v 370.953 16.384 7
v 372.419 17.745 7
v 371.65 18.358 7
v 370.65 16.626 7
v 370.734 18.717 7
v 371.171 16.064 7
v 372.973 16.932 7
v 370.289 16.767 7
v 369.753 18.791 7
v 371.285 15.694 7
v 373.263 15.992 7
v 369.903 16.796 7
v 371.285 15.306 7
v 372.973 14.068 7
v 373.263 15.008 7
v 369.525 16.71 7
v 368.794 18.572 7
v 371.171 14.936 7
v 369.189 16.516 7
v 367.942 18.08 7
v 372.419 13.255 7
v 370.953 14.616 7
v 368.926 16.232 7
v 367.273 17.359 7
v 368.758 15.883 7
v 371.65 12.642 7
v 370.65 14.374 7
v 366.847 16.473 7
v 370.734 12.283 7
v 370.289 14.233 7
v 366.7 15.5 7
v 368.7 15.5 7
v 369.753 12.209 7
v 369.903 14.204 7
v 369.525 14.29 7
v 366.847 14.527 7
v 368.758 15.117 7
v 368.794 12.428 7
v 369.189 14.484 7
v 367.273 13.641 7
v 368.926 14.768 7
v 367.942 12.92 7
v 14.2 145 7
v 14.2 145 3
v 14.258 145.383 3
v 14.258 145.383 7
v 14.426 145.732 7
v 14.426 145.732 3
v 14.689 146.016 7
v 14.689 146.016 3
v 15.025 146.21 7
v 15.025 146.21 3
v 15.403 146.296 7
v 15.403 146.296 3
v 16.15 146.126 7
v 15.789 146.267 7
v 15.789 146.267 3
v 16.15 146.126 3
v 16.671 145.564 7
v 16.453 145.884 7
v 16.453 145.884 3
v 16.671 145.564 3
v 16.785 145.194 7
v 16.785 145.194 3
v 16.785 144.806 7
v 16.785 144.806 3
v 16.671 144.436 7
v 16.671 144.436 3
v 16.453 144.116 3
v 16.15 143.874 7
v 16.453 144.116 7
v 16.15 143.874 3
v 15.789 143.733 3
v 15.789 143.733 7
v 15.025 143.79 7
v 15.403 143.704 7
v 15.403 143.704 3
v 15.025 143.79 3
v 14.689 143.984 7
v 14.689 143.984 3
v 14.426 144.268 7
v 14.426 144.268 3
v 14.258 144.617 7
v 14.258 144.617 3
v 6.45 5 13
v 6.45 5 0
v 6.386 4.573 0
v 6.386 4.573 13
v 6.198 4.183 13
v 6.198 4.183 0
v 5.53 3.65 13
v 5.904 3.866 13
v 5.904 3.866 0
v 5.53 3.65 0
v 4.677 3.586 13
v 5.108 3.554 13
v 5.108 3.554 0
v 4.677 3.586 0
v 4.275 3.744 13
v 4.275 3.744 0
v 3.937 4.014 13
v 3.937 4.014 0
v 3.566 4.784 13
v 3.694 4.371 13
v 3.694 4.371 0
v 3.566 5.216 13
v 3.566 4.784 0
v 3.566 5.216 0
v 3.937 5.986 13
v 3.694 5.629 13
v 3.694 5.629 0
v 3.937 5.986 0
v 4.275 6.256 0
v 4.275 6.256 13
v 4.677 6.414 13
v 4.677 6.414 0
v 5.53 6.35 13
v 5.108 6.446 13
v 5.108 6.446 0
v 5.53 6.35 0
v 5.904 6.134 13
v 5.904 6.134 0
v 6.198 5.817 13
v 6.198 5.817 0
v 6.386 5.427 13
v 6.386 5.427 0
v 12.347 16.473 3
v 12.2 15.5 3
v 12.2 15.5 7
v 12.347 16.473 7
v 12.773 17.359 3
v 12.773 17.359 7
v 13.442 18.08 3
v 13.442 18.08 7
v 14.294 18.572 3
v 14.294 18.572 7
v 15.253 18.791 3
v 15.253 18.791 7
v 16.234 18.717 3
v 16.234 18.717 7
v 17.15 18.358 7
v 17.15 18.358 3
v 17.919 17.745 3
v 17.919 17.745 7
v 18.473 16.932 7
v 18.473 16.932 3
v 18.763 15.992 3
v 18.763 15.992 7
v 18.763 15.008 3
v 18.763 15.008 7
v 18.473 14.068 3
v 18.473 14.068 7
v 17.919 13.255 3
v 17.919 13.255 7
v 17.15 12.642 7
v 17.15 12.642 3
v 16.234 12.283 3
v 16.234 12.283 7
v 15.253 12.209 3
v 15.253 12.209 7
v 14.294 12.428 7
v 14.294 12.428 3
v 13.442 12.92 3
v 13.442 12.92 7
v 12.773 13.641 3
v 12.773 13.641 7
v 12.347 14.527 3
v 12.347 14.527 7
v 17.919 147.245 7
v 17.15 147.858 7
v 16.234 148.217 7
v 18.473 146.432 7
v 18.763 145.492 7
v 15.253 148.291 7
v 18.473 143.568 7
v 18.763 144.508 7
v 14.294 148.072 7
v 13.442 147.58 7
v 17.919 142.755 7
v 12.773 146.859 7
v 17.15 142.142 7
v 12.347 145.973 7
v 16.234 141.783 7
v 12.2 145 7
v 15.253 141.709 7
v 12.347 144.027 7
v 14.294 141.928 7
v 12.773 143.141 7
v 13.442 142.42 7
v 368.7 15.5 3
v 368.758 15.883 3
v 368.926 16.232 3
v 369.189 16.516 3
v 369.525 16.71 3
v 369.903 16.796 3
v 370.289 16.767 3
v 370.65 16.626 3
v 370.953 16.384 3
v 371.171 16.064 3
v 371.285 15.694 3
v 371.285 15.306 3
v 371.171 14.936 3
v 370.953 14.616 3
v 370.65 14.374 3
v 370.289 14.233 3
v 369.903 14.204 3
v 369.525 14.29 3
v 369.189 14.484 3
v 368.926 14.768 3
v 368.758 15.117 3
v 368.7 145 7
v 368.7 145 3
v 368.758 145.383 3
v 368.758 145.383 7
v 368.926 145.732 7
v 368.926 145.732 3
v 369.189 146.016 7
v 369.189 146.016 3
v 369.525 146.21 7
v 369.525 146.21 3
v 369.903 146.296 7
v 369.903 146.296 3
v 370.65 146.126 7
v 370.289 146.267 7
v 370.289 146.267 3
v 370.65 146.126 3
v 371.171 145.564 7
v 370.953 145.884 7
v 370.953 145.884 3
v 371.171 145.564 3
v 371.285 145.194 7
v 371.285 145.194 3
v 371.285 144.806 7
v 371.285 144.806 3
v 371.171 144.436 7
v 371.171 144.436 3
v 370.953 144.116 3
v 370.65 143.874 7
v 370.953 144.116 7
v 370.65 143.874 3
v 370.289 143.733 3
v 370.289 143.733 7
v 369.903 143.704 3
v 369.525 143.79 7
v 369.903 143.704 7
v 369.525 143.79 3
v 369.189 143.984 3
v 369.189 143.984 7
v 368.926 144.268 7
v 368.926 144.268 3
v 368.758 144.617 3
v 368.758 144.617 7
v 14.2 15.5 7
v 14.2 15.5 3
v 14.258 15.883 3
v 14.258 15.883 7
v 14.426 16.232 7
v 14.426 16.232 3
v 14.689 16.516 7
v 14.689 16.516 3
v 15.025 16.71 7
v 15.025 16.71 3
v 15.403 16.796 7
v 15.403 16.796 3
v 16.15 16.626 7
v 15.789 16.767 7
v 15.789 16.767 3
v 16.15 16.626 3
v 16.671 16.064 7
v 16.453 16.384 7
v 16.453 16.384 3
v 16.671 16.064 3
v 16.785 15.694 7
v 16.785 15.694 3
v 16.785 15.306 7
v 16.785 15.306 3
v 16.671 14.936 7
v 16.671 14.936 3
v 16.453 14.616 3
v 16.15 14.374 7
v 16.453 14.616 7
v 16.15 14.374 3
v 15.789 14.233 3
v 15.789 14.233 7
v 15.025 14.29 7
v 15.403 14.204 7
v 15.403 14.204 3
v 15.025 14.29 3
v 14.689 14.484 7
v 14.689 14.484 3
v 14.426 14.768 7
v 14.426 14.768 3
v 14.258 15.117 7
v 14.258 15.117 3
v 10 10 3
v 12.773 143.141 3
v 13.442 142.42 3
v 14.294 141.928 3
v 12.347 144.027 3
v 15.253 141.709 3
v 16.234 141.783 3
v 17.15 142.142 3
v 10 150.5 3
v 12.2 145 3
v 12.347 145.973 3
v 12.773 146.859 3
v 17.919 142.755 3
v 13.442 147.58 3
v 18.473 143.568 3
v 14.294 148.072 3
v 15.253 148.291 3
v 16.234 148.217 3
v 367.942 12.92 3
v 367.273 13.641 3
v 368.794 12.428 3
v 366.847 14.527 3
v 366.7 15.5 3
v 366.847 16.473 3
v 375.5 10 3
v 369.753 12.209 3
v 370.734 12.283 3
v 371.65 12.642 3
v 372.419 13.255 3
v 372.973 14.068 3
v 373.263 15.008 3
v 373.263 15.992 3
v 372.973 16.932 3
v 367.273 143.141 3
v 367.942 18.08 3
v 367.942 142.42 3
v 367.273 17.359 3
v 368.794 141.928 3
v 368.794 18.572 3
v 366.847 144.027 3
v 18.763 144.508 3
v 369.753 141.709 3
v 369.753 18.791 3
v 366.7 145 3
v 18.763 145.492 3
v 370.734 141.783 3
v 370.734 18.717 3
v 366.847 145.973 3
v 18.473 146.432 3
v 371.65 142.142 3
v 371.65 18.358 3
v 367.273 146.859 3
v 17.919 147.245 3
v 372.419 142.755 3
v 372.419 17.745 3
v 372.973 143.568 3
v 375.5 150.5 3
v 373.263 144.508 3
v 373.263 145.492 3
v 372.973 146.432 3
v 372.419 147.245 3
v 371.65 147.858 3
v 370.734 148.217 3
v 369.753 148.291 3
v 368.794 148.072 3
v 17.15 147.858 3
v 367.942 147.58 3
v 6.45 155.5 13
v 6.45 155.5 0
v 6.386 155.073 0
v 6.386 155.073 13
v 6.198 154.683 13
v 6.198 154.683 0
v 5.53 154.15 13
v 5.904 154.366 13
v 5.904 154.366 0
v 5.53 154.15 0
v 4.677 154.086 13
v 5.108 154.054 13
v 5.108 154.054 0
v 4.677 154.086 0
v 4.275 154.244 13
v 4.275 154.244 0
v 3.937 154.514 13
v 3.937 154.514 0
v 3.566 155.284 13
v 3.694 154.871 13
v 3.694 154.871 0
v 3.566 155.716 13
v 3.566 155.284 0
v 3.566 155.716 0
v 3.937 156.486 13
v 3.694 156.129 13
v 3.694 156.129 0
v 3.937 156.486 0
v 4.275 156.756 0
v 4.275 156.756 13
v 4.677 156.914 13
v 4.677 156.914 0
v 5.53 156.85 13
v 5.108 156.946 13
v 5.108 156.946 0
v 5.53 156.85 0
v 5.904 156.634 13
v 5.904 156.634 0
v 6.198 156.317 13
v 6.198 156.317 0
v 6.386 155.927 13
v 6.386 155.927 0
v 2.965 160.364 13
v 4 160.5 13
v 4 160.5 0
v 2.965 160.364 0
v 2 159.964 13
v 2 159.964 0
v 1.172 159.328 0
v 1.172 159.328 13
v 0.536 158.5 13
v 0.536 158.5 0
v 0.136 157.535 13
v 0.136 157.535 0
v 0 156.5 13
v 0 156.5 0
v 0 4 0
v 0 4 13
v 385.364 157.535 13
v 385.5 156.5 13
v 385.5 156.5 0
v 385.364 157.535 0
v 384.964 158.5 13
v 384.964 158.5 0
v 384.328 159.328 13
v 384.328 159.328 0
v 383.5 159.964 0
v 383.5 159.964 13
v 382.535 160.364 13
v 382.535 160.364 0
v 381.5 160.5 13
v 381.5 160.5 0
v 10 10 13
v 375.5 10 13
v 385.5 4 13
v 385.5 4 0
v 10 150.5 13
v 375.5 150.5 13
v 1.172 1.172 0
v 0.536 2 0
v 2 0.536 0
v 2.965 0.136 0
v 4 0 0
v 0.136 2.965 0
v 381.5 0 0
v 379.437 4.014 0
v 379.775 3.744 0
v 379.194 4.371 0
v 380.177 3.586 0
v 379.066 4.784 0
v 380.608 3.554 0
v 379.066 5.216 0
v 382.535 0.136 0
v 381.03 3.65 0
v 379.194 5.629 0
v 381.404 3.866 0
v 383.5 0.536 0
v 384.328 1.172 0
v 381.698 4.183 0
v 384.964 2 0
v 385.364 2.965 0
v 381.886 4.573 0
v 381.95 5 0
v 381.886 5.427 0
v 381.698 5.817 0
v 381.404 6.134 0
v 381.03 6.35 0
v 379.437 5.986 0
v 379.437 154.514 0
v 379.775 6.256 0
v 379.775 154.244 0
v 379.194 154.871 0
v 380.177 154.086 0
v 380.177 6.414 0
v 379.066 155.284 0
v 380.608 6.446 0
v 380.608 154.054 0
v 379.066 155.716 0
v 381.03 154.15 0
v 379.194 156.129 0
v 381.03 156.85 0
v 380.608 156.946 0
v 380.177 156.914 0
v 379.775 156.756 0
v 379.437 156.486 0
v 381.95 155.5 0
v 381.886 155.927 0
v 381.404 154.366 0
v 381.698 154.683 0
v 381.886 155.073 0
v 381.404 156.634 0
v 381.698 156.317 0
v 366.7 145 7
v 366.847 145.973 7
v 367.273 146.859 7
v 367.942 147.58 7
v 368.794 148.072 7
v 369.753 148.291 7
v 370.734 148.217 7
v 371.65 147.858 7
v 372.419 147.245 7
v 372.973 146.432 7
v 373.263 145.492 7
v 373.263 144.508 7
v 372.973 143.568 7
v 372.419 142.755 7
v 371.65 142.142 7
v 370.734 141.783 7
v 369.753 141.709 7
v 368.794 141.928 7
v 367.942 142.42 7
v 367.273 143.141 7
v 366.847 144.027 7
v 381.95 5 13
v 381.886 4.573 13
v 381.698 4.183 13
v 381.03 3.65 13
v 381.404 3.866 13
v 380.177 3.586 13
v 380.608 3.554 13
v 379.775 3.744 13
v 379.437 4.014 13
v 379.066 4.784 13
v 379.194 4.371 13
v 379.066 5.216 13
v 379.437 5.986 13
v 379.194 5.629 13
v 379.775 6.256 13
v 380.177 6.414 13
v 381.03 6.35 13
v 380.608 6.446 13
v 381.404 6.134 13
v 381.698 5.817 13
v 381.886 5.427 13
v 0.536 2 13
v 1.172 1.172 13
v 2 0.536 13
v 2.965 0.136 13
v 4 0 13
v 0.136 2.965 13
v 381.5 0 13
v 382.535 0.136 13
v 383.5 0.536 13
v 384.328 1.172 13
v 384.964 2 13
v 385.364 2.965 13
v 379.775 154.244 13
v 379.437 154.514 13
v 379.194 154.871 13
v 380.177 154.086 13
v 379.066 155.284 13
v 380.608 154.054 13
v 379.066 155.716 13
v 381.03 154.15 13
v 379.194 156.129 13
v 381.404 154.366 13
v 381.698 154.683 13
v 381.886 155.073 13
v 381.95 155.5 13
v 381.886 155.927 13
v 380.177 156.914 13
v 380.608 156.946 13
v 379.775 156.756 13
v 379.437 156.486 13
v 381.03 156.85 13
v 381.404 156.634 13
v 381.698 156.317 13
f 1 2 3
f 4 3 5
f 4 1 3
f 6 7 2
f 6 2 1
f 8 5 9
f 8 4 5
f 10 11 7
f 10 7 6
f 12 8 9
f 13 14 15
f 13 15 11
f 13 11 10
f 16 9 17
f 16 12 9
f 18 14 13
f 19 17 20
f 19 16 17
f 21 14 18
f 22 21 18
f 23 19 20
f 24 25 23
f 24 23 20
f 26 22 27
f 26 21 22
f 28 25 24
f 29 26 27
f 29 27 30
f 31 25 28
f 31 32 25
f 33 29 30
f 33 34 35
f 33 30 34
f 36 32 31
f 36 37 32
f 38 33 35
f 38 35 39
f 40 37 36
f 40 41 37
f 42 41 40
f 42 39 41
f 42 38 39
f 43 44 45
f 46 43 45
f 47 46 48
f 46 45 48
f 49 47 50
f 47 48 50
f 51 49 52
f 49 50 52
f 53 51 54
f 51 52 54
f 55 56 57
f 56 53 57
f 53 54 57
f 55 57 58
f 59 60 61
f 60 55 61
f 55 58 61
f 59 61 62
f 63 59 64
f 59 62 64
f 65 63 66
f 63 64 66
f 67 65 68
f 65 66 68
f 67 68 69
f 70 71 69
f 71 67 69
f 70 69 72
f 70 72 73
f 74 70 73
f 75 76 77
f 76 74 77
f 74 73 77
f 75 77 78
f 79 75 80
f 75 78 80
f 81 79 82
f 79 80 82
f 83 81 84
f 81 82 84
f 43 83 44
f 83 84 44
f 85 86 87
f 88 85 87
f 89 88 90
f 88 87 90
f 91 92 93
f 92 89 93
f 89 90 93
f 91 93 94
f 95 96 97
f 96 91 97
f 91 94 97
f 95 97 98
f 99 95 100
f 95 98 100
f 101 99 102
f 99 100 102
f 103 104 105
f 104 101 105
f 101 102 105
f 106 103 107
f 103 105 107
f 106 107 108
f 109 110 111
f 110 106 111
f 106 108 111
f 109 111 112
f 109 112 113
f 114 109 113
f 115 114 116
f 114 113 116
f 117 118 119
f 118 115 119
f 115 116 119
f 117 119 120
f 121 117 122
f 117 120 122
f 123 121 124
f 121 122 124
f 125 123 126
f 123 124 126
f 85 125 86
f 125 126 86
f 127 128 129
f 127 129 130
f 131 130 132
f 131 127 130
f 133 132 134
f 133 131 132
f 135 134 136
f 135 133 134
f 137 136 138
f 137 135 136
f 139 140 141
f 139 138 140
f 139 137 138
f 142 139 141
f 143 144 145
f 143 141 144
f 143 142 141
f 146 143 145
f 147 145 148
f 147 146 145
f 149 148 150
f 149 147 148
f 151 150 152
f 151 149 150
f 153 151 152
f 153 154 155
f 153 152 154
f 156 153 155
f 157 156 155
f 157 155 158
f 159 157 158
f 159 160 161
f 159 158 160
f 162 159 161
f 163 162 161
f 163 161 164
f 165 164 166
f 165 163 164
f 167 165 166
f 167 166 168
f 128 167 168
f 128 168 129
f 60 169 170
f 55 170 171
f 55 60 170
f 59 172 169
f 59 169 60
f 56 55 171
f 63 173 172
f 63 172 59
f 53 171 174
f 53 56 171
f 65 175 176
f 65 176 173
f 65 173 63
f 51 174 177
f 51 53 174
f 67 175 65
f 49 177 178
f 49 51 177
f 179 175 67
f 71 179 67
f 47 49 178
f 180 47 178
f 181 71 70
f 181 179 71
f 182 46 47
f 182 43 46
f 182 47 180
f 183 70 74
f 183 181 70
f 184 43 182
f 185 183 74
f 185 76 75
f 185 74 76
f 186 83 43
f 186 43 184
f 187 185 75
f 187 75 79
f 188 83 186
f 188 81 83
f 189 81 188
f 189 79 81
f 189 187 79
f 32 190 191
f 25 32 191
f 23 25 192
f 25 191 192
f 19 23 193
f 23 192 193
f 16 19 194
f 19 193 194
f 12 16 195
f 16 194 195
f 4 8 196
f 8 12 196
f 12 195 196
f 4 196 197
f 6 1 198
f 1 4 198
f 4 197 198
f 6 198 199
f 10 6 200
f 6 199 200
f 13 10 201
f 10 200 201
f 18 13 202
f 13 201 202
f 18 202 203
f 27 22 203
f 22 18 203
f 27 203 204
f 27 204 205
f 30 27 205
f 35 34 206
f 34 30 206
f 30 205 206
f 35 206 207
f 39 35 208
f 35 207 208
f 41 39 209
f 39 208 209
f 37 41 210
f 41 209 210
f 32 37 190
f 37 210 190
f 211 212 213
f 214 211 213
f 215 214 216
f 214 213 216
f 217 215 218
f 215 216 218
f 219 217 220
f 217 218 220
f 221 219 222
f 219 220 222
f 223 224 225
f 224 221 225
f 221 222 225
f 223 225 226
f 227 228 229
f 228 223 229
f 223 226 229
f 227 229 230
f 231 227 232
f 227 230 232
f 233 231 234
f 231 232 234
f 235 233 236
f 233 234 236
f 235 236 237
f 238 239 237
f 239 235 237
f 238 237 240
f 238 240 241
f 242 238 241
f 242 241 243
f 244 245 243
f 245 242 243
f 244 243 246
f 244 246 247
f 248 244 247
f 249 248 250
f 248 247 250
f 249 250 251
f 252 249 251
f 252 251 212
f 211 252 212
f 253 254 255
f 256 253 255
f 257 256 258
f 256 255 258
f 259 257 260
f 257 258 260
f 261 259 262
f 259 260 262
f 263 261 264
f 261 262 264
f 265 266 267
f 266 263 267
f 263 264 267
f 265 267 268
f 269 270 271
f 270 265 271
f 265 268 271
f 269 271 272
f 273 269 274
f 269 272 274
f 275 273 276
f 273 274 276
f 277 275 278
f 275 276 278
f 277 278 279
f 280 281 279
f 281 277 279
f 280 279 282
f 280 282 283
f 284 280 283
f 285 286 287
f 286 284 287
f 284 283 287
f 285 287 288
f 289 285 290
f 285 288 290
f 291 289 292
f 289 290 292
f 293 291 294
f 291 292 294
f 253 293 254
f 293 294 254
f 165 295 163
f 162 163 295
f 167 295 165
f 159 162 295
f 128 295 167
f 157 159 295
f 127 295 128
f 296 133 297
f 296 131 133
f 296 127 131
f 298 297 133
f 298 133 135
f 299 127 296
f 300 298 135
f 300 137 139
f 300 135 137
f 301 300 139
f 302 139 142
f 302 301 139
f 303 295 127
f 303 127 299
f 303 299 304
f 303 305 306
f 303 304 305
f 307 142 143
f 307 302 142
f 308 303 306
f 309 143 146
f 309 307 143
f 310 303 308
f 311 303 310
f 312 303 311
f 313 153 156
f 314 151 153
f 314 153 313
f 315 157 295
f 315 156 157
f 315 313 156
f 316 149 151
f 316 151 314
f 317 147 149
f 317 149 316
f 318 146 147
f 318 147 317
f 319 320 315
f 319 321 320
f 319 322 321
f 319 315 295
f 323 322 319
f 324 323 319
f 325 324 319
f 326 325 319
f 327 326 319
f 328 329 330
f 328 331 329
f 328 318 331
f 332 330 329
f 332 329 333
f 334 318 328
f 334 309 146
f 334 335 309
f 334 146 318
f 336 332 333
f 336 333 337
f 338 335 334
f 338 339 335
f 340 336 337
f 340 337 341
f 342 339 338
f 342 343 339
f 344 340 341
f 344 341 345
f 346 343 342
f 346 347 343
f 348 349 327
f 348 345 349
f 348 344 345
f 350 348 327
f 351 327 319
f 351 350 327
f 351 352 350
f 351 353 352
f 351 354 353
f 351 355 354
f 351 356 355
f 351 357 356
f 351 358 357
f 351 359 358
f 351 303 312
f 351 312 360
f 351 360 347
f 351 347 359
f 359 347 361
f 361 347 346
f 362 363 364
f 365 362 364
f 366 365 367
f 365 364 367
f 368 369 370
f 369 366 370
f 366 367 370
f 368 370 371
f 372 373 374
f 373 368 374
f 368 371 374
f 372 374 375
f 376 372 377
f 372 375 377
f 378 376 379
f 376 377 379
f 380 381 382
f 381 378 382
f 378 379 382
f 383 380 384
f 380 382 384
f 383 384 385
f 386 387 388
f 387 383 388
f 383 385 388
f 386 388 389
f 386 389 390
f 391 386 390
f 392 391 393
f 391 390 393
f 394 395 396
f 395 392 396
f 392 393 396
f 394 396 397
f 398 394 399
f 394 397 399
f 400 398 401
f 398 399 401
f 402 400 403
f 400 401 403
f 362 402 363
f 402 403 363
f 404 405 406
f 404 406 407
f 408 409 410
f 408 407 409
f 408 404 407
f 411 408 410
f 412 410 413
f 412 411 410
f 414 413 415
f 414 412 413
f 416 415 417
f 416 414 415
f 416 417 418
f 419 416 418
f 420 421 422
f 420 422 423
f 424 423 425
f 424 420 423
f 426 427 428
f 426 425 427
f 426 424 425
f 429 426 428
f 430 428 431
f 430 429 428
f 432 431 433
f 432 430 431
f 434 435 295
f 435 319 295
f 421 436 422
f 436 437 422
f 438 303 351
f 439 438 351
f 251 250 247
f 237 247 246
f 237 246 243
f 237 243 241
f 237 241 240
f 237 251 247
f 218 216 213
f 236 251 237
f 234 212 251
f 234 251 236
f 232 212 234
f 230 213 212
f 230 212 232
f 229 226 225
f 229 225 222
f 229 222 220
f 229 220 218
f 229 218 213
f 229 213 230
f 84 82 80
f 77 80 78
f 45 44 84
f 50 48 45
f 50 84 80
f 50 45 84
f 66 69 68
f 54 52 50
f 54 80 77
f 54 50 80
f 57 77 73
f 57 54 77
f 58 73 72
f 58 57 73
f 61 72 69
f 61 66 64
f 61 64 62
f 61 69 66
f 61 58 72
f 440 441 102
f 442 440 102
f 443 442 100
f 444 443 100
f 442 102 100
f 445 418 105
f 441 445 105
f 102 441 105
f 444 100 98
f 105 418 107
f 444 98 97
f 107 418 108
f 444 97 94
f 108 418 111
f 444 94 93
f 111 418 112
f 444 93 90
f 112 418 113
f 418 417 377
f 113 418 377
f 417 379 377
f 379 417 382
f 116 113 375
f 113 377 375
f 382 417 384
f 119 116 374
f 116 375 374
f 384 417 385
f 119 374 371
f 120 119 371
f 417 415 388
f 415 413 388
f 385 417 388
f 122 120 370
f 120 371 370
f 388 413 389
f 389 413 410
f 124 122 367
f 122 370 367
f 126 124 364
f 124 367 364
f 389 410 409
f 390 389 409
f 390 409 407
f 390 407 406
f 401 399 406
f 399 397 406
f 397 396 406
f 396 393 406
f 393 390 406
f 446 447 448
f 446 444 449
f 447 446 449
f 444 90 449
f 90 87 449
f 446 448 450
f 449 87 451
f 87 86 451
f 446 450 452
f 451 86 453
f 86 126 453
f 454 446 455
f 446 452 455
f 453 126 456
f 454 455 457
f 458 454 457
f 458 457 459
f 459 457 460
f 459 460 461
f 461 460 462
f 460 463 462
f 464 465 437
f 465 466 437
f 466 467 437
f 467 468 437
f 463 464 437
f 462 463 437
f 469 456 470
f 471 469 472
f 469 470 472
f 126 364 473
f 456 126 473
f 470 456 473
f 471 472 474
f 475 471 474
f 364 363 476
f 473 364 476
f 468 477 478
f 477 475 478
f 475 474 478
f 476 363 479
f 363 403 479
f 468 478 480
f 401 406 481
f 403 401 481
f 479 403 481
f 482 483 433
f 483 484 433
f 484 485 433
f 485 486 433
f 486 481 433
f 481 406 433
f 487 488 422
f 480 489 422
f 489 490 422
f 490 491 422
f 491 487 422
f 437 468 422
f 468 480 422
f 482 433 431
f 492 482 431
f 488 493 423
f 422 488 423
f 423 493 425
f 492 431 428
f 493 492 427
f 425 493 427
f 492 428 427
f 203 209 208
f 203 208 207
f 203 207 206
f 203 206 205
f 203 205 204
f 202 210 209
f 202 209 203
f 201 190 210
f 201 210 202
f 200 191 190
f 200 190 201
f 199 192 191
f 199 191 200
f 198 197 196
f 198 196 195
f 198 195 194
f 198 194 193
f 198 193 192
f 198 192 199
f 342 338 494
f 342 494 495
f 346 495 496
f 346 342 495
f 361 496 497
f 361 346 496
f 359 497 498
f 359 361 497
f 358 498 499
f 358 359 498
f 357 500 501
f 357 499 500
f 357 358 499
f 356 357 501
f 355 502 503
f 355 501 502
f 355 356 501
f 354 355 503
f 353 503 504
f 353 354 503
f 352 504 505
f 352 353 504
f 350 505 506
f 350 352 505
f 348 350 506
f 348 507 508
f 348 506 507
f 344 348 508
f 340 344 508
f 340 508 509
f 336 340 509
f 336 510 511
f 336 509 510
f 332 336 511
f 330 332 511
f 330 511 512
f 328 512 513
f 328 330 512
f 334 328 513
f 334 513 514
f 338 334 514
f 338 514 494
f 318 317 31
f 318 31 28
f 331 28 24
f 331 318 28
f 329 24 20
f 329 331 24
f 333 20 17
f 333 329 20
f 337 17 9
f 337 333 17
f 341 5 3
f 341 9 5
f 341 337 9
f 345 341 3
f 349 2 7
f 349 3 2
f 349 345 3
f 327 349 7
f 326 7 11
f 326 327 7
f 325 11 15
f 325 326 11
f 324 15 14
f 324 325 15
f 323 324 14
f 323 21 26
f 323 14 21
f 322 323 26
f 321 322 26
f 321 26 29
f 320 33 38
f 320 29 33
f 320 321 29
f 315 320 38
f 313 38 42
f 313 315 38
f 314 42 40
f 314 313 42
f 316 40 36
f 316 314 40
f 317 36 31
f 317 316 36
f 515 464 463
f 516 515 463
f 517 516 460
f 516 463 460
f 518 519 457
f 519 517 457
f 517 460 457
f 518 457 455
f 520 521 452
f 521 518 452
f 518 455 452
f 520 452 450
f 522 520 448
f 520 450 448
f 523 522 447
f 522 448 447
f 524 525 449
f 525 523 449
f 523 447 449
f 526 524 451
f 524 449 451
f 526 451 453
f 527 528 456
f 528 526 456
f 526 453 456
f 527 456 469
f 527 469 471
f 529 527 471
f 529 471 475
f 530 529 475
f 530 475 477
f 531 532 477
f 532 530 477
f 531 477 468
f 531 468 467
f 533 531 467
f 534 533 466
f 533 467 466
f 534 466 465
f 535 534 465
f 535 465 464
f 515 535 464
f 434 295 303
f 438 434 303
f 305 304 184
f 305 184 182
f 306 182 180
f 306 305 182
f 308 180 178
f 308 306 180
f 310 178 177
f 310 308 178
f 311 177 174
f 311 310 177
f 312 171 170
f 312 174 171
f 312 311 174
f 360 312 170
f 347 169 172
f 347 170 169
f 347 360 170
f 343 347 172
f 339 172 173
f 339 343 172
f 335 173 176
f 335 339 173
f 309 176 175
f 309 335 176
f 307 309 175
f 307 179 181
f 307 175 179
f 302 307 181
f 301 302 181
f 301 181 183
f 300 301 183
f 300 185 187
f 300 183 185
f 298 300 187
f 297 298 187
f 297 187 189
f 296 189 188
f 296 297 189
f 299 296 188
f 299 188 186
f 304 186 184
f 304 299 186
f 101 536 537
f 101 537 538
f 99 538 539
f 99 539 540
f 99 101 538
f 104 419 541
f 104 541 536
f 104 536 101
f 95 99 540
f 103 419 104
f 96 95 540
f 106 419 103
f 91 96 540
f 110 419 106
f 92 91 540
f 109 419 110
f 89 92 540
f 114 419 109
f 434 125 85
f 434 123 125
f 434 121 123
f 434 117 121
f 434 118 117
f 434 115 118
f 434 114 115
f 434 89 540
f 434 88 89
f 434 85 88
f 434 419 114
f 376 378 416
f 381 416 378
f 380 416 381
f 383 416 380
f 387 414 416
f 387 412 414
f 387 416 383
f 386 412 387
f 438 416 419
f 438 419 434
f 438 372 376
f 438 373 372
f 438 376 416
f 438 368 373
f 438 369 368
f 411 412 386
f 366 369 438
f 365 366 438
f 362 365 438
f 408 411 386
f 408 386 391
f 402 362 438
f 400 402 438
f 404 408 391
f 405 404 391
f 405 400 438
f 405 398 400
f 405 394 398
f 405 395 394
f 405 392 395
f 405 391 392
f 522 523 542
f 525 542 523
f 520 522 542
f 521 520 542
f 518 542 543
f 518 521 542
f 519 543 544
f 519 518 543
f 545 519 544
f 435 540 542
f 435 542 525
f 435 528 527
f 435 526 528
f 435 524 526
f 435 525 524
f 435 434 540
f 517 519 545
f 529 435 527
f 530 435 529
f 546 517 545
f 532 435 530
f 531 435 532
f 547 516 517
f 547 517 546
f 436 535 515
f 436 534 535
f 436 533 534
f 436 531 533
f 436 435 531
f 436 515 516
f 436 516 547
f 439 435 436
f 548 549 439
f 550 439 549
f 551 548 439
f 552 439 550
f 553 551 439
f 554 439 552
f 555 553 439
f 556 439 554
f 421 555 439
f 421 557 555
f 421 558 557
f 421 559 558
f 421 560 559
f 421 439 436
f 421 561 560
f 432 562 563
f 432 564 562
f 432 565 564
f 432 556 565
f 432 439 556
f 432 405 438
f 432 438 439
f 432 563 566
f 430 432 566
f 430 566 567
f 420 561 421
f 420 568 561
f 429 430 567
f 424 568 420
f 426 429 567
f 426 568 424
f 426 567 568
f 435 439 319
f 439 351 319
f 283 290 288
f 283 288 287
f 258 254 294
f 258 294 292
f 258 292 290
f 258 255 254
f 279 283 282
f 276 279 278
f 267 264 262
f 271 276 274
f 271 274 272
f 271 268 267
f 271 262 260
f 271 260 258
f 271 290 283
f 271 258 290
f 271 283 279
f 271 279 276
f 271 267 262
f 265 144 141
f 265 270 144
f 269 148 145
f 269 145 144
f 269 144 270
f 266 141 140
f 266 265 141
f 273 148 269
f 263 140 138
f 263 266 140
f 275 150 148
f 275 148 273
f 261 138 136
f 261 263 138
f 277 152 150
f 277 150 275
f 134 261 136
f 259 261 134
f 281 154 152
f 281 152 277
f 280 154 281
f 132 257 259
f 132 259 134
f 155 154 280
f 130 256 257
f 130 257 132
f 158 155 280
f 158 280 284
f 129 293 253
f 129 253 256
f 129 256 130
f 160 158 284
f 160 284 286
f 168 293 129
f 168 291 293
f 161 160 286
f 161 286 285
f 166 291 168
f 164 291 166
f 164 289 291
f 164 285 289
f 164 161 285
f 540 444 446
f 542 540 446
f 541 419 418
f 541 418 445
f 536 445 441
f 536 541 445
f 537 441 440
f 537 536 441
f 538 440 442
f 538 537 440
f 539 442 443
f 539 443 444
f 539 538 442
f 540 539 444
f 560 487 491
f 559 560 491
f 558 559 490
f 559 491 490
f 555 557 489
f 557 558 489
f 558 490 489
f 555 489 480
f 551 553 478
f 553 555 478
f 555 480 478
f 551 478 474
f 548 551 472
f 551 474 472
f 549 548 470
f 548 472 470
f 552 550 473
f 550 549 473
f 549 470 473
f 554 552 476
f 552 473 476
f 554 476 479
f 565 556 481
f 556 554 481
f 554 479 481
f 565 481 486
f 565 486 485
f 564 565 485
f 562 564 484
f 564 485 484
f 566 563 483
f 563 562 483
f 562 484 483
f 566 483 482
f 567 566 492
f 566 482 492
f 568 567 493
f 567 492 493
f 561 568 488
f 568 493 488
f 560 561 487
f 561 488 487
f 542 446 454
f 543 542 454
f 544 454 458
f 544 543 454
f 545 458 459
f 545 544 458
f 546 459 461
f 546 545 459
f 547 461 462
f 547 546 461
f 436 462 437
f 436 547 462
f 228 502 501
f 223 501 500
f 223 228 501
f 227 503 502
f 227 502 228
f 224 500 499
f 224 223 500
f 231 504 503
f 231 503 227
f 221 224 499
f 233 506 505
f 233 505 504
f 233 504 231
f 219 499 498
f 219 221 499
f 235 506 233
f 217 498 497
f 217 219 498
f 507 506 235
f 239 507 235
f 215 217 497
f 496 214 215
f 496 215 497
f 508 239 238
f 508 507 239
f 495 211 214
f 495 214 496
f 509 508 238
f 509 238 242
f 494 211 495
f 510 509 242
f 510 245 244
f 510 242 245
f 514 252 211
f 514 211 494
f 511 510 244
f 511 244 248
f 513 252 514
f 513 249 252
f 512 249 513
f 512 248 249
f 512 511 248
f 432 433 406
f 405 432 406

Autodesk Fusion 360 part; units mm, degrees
sketch "Sketch1" plane through (0, 0, 0) normal (0, 0, 1) x (1, 0, 0)
  line L0 (0, 0) -> (385.5, 0)
  line L1 (385.5, 0) -> (385.5, 160.5)
  line L2 (385.5, 160.5) -> (0, 160.5)
  line L3 (0, 160.5) -> (0, 0)
  line L4 (10, 150.5) -> (375.5, 150.5)
  line L5 (375.5, 150.5) -> (375.5, 10)
  line L6 (375.5, 10) -> (10, 10)
  line L7 (10, 10) -> (10, 150.5)
  circle A0 centre (5, 155.5) radius 1.45
  circle A1 centre (5, 5) radius 1.45
  circle A2 centre (380.5, 5) radius 1.45
  circle A3 centre (380.5, 155.5) radius 1.45
  dimension "d1" = 160.5
  dimension "d2" = 385.5
  dimension "d3" = 10
  dimension "d4" = 10
  dimension "d5" = 10
  dimension "d6" = 10
  dimension "d7" = 2.9
  dimension "d8" = 2.9
  dimension "d9" = 2.9
  dimension "d10" = 2.9
  dimension "d11" = 5
  dimension "d12" = 5
  dimension "d13" = 5
  dimension "d14" = 5
  dimension "d15" = 5
  dimension "d16" = 5
  dimension "d17" = 5
  dimension "d18" = 5
extrude "Extrude1" add sketch "Sketch1" along normal blind 13
sketch "Sketch2" plane through (0, 0, 0) normal (0, 0, 1) x (1, 0, 0)
  line L0 (0, 0) -> (385.5, 0)
  line L1 (385.5, 0) -> (385.5, 160.5)
  line L2 (385.5, 160.5) -> (0, 160.5)
  line L3 (0, 160.5) -> (0, 0)
  line L4 (375.5, 10) -> (10, 10)
  line L5 (10, 10) -> (10, 150.5)
  line L6 (10, 150.5) -> (375.5, 150.5)
  line L7 (375.5, 150.5) -> (375.5, 10)
  dimension "d21" = 160.5
  dimension "d22" = 385.5
  dimension "d23" = 10
  dimension "d24" = 10
  dimension "d25" = 365.5
  dimension "d26" = 140.5
extrude "Extrude2" add sketch "Sketch2" along normal blind 3 contours L4 L5 L6 L7
sketch "Sketch3" plane through (0, 0, 0) normal (0, 1, 0) x (1, 0, 0)
sketch "Sketch4" plane through (0, 0, 0) normal (0, 0, 1) x (1, 0, 0)
  line L0 (0, -20) -> (385.5, -20)
  line L1 (385.5, -20) -> (385.5, -180.5)
  line L2 (385.5, -180.5) -> (0, -180.5)
  line L3 (0, -180.5) -> (0, -20)
  line L4 (375.5, -170.5) -> (10, -170.5)
  line L5 (10, -170.5) -> (10, -30)
  line L6 (10, -30) -> (375.5, -30)
  line L7 (375.5, -30) -> (375.5, -170.5)
  circle A0 centre (5, -175.5) radius 1.45
  circle A1 centre (5, -25) radius 1.45
  circle A2 centre (380.5, -25) radius 1.45
  circle A3 centre (380.5, -175.5) radius 1.45
  dimension "d29" = 160.5
  dimension "d30" = 385.5
  dimension "d31" = 10
  dimension "d32" = 10
  dimension "d33" = 10
  dimension "d34" = 10
  dimension "d35" = 2.9
  dimension "d36" = 5
  dimension "d37" = 5
  dimension "d38" = 2.9
  dimension "d39" = 5
  dimension "d40" = 5
  dimension "d41" = 2.9
  dimension "d42" = 5
  dimension "d43" = 5
  dimension "d44" = 2.9
  dimension "d45" = 5
  dimension "d46" = 5
sketch "Sketch5" plane through (0, 0, 3) normal (0, 0, 1) x (-1, 0, 0)
  line L0 (-375.5, -150.5) -> (-10, -150.5)
  line L1 (-10, -150.5) -> (-10, -10)
  line L2 (-10, -10) -> (-375.5, -10)
  line L3 (-375.5, -10) -> (-375.5, -150.5)
  circle A0 centre (-15.5, -145) radius 3.3
  circle A1 centre (-15.5, -145) radius 1.3
  circle A2 centre (-15.5, -15.5) radius 1.3
  circle A3 centre (-15.5, -15.5) radius 3.3
  circle A4 centre (-370, -15.5) radius 1.3
  circle A5 centre (-370, -15.5) radius 3.3
  circle A6 centre (-370, -145) radius 1.3
  circle A7 centre (-370, -145) radius 3.3
  dimension "d49" = 6.6
  dimension "d50" = 5.5
  dimension "d51" = 5.5
  dimension "d52" = 2.6
  dimension "d53" = 2.6
  dimension "d54" = 5.5
  dimension "d55" = 5.5
  dimension "d56" = 6.6
  dimension "d57" = 2.6
  dimension "d58" = 6.6
  dimension "d59" = 5.5
  dimension "d60" = 5.5
  dimension "d61" = 2.6
  dimension "d62" = 6.6
  dimension "d63" = 5.5
  dimension "d64" = 5.5
extrude "Extrude4" add sketch "Sketch5" along normal blind 4 contours A0 | A3 | A5 | A7
sketch "Sketch6" plane through (0, 0, 3) normal (0, 0, 1) x (-1, 0, 0)
  circle A0 centre (-380.5, 25) radius 1.45
sketch "Sketch7" plane through (0, 0, 0) normal (0, 0, -1) x (1, 0, 0)
  circle A0 centre (5, 25) radius 1.45
  circle A1 centre (5, 175.5) radius 1.45
  circle A2 centre (380.5, 25) radius 1.45
  circle A3 centre (380.5, 175.5) radius 1.45
  line L0 (385.5, 180.5) -> (0, 180.5)
  line L1 (0, 180.5) -> (0, 20)
  line L2 (0, 20) -> (385.5, 20)
  line L3 (385.5, 20) -> (385.5, 180.5)
  line L4 (0, 20) -> (385.5, 20)
  line L5 (385.5, 20) -> (385.5, 180.5)
  line L6 (385.5, 180.5) -> (0, 180.5)
  line L7 (0, 180.5) -> (0, 20)
  line L8 (0, 20) -> (385.5, 20)
  line L9 (385.5, 20) -> (385.5, 180.5)
  line L10 (385.5, 180.5) -> (0, 180.5)
  line L11 (0, 180.5) -> (0, 20)
  line L12 (0, 20) -> (385.5, 20)
  line L13 (385.5, 20) -> (385.5, 180.5)
  line L14 (385.5, 180.5) -> (0, 180.5)
  line L15 (0, 180.5) -> (0, 20)
  line L16 (15.5, 165) -> (370, 165)
  line L17 (370, 165) -> (370, 35.5)
  line L18 (370, 35.5) -> (15.5, 35.5)
  line L19 (15.5, 35.5) -> (15.5, 165)
  line L20 (0, 180.5) -> (385.5, 180.5)
  dimension "d68" = 15.5
  dimension "d70" = 15.5
  dimension "d71" = 15.5
  dimension "d72" = 15.5
fillet "Fillet1" radius 4 1 edges at (0, 0, 6.5)
fillet "Fillet2" radius 4 1 edges at (0, 160.5, 6.5)
fillet "Fillet3" radius 4 1 edges at (385.5, 160.5, 6.5)
fillet "Fillet4" radius 4 1 edges at (385.5, 0, 6.5)
